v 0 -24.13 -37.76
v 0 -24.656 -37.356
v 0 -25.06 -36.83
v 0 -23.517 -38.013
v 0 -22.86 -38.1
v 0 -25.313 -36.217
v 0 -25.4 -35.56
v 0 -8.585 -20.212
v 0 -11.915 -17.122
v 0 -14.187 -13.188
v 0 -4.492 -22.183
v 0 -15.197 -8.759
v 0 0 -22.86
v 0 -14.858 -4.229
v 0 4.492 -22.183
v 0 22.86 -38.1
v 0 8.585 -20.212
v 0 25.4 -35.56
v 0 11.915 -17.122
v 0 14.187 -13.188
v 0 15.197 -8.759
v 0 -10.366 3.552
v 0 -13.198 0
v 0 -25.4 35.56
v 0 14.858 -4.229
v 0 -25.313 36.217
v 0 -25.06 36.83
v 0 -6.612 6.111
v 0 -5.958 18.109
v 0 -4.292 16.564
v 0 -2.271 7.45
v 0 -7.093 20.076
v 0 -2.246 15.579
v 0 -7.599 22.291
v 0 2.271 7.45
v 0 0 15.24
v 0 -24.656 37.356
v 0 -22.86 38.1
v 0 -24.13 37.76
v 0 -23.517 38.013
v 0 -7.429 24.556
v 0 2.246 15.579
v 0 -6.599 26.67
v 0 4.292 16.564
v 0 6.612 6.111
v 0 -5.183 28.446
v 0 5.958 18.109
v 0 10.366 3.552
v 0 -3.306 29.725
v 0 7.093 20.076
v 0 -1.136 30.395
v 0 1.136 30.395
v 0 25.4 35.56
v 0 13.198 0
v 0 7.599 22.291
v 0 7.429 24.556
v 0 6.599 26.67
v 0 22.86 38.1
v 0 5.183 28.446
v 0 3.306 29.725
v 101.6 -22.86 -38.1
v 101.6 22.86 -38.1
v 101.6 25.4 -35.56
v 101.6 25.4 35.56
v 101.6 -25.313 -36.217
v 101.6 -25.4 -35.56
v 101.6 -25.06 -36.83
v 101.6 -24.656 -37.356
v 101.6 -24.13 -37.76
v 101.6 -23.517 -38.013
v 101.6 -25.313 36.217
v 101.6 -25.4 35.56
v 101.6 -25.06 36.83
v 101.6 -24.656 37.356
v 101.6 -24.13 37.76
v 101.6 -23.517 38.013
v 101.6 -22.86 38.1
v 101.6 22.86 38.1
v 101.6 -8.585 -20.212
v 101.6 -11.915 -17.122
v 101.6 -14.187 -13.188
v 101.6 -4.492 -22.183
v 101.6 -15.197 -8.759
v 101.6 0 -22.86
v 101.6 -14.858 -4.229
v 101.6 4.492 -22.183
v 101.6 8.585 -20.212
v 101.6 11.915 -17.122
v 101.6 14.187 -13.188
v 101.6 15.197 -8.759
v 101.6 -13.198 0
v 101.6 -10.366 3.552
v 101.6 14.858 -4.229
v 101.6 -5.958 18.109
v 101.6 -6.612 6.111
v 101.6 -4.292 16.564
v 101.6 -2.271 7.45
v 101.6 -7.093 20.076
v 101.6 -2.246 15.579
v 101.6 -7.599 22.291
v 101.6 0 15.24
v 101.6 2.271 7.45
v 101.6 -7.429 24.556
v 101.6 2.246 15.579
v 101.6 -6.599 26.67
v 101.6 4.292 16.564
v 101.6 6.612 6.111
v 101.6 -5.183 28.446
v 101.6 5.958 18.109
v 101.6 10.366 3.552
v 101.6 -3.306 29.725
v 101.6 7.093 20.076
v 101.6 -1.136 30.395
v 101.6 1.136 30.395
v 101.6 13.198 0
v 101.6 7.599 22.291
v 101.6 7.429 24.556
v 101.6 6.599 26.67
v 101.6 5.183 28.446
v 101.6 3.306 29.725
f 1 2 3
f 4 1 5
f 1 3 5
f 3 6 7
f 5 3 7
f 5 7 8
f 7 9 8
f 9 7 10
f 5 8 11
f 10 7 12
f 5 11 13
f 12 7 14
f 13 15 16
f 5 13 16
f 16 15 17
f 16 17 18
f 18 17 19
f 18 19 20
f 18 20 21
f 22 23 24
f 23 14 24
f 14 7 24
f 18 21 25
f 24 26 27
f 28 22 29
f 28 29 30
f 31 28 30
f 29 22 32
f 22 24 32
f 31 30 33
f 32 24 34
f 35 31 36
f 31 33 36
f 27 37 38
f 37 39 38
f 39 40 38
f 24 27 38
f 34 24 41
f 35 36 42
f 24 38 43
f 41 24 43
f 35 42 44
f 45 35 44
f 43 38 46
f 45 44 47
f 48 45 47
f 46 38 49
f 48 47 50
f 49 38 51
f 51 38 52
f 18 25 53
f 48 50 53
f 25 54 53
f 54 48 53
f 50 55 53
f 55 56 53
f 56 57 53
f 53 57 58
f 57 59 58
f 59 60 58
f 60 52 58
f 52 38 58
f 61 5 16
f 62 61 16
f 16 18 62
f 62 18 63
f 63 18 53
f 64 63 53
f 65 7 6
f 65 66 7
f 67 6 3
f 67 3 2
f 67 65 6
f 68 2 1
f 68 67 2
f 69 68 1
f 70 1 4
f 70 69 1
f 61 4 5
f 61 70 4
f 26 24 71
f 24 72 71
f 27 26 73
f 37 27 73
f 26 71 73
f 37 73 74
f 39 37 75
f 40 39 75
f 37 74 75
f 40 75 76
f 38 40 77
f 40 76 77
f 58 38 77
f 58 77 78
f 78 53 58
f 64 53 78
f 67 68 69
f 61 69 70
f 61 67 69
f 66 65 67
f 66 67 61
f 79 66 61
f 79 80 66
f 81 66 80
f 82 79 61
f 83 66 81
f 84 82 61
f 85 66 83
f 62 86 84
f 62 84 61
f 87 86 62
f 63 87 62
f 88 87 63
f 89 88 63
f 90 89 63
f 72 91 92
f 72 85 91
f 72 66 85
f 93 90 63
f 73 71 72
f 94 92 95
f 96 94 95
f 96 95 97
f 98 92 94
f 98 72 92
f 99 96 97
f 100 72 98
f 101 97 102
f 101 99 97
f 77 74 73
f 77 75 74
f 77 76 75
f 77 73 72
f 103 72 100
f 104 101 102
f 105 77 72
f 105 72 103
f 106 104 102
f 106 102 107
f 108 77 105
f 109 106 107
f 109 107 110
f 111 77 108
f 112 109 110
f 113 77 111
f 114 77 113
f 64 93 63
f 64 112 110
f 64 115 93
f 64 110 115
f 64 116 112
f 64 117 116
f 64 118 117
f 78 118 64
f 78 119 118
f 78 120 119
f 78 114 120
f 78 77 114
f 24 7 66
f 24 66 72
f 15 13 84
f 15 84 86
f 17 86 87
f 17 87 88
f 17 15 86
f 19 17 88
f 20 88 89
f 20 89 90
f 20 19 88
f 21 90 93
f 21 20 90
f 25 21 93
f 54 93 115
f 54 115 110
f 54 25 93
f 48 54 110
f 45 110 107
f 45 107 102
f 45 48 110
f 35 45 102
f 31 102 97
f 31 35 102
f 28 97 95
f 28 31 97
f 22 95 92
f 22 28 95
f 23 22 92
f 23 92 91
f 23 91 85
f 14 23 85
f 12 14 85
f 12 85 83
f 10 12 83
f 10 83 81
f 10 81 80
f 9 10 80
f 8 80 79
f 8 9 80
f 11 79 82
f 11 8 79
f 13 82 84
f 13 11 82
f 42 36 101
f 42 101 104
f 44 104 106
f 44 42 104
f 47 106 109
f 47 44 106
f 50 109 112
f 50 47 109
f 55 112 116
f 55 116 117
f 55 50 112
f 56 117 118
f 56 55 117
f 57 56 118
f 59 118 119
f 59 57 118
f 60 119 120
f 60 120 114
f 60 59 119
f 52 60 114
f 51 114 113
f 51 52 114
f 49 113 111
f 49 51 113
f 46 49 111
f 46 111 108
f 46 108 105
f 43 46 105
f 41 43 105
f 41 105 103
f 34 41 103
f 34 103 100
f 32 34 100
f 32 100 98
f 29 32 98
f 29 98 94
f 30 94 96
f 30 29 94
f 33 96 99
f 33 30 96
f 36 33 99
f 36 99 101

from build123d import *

# Parameters (mm, degrees)
SKETCH1_W           = 50.8
SKETCH1_H           = 76.2
SKETCH1_R           = 15.24
SKETCH1_R_2         = 7.62
BOSS_EXTRUDE1_DEPTH = 101.6
FILLET1_R           = 2.54
CHAMFER1_SIZE       = 2.54


with BuildPart() as part:
    # Sketch1 → Boss-Extrude1 (new body)
    with BuildSketch(Plane.YZ):
        Rectangle(SKETCH1_W, SKETCH1_H)
        with Locations(Location((0, -7.62, 0), (0, 0, 270))):
            Circle(SKETCH1_R, mode=Mode.SUBTRACT)
        with Locations(Location((0, 22.86, 0), (0, 0, 270))):
            Circle(SKETCH1_R_2, mode=Mode.SUBTRACT)
    extrude(amount=BOSS_EXTRUDE1_DEPTH)

    # Fillet1
    fillet1_edges = [part.edges().sort_by_distance(p)[0] for p in [
        (50.8, -25.4, 38.1),
        (50.8, -25.4, -38.1),
    ]]
    fillet(fillet1_edges, radius=FILLET1_R)

    # Chamfer1
    chamfer1_edges = [part.edges().sort_by_distance(p)[0] for p in [
        (50.8, 25.4, 38.1),
        (50.8, 25.4, -38.1),
    ]]
    chamfer(chamfer1_edges, length=CHAMFER1_SIZE)


solid = part.part
